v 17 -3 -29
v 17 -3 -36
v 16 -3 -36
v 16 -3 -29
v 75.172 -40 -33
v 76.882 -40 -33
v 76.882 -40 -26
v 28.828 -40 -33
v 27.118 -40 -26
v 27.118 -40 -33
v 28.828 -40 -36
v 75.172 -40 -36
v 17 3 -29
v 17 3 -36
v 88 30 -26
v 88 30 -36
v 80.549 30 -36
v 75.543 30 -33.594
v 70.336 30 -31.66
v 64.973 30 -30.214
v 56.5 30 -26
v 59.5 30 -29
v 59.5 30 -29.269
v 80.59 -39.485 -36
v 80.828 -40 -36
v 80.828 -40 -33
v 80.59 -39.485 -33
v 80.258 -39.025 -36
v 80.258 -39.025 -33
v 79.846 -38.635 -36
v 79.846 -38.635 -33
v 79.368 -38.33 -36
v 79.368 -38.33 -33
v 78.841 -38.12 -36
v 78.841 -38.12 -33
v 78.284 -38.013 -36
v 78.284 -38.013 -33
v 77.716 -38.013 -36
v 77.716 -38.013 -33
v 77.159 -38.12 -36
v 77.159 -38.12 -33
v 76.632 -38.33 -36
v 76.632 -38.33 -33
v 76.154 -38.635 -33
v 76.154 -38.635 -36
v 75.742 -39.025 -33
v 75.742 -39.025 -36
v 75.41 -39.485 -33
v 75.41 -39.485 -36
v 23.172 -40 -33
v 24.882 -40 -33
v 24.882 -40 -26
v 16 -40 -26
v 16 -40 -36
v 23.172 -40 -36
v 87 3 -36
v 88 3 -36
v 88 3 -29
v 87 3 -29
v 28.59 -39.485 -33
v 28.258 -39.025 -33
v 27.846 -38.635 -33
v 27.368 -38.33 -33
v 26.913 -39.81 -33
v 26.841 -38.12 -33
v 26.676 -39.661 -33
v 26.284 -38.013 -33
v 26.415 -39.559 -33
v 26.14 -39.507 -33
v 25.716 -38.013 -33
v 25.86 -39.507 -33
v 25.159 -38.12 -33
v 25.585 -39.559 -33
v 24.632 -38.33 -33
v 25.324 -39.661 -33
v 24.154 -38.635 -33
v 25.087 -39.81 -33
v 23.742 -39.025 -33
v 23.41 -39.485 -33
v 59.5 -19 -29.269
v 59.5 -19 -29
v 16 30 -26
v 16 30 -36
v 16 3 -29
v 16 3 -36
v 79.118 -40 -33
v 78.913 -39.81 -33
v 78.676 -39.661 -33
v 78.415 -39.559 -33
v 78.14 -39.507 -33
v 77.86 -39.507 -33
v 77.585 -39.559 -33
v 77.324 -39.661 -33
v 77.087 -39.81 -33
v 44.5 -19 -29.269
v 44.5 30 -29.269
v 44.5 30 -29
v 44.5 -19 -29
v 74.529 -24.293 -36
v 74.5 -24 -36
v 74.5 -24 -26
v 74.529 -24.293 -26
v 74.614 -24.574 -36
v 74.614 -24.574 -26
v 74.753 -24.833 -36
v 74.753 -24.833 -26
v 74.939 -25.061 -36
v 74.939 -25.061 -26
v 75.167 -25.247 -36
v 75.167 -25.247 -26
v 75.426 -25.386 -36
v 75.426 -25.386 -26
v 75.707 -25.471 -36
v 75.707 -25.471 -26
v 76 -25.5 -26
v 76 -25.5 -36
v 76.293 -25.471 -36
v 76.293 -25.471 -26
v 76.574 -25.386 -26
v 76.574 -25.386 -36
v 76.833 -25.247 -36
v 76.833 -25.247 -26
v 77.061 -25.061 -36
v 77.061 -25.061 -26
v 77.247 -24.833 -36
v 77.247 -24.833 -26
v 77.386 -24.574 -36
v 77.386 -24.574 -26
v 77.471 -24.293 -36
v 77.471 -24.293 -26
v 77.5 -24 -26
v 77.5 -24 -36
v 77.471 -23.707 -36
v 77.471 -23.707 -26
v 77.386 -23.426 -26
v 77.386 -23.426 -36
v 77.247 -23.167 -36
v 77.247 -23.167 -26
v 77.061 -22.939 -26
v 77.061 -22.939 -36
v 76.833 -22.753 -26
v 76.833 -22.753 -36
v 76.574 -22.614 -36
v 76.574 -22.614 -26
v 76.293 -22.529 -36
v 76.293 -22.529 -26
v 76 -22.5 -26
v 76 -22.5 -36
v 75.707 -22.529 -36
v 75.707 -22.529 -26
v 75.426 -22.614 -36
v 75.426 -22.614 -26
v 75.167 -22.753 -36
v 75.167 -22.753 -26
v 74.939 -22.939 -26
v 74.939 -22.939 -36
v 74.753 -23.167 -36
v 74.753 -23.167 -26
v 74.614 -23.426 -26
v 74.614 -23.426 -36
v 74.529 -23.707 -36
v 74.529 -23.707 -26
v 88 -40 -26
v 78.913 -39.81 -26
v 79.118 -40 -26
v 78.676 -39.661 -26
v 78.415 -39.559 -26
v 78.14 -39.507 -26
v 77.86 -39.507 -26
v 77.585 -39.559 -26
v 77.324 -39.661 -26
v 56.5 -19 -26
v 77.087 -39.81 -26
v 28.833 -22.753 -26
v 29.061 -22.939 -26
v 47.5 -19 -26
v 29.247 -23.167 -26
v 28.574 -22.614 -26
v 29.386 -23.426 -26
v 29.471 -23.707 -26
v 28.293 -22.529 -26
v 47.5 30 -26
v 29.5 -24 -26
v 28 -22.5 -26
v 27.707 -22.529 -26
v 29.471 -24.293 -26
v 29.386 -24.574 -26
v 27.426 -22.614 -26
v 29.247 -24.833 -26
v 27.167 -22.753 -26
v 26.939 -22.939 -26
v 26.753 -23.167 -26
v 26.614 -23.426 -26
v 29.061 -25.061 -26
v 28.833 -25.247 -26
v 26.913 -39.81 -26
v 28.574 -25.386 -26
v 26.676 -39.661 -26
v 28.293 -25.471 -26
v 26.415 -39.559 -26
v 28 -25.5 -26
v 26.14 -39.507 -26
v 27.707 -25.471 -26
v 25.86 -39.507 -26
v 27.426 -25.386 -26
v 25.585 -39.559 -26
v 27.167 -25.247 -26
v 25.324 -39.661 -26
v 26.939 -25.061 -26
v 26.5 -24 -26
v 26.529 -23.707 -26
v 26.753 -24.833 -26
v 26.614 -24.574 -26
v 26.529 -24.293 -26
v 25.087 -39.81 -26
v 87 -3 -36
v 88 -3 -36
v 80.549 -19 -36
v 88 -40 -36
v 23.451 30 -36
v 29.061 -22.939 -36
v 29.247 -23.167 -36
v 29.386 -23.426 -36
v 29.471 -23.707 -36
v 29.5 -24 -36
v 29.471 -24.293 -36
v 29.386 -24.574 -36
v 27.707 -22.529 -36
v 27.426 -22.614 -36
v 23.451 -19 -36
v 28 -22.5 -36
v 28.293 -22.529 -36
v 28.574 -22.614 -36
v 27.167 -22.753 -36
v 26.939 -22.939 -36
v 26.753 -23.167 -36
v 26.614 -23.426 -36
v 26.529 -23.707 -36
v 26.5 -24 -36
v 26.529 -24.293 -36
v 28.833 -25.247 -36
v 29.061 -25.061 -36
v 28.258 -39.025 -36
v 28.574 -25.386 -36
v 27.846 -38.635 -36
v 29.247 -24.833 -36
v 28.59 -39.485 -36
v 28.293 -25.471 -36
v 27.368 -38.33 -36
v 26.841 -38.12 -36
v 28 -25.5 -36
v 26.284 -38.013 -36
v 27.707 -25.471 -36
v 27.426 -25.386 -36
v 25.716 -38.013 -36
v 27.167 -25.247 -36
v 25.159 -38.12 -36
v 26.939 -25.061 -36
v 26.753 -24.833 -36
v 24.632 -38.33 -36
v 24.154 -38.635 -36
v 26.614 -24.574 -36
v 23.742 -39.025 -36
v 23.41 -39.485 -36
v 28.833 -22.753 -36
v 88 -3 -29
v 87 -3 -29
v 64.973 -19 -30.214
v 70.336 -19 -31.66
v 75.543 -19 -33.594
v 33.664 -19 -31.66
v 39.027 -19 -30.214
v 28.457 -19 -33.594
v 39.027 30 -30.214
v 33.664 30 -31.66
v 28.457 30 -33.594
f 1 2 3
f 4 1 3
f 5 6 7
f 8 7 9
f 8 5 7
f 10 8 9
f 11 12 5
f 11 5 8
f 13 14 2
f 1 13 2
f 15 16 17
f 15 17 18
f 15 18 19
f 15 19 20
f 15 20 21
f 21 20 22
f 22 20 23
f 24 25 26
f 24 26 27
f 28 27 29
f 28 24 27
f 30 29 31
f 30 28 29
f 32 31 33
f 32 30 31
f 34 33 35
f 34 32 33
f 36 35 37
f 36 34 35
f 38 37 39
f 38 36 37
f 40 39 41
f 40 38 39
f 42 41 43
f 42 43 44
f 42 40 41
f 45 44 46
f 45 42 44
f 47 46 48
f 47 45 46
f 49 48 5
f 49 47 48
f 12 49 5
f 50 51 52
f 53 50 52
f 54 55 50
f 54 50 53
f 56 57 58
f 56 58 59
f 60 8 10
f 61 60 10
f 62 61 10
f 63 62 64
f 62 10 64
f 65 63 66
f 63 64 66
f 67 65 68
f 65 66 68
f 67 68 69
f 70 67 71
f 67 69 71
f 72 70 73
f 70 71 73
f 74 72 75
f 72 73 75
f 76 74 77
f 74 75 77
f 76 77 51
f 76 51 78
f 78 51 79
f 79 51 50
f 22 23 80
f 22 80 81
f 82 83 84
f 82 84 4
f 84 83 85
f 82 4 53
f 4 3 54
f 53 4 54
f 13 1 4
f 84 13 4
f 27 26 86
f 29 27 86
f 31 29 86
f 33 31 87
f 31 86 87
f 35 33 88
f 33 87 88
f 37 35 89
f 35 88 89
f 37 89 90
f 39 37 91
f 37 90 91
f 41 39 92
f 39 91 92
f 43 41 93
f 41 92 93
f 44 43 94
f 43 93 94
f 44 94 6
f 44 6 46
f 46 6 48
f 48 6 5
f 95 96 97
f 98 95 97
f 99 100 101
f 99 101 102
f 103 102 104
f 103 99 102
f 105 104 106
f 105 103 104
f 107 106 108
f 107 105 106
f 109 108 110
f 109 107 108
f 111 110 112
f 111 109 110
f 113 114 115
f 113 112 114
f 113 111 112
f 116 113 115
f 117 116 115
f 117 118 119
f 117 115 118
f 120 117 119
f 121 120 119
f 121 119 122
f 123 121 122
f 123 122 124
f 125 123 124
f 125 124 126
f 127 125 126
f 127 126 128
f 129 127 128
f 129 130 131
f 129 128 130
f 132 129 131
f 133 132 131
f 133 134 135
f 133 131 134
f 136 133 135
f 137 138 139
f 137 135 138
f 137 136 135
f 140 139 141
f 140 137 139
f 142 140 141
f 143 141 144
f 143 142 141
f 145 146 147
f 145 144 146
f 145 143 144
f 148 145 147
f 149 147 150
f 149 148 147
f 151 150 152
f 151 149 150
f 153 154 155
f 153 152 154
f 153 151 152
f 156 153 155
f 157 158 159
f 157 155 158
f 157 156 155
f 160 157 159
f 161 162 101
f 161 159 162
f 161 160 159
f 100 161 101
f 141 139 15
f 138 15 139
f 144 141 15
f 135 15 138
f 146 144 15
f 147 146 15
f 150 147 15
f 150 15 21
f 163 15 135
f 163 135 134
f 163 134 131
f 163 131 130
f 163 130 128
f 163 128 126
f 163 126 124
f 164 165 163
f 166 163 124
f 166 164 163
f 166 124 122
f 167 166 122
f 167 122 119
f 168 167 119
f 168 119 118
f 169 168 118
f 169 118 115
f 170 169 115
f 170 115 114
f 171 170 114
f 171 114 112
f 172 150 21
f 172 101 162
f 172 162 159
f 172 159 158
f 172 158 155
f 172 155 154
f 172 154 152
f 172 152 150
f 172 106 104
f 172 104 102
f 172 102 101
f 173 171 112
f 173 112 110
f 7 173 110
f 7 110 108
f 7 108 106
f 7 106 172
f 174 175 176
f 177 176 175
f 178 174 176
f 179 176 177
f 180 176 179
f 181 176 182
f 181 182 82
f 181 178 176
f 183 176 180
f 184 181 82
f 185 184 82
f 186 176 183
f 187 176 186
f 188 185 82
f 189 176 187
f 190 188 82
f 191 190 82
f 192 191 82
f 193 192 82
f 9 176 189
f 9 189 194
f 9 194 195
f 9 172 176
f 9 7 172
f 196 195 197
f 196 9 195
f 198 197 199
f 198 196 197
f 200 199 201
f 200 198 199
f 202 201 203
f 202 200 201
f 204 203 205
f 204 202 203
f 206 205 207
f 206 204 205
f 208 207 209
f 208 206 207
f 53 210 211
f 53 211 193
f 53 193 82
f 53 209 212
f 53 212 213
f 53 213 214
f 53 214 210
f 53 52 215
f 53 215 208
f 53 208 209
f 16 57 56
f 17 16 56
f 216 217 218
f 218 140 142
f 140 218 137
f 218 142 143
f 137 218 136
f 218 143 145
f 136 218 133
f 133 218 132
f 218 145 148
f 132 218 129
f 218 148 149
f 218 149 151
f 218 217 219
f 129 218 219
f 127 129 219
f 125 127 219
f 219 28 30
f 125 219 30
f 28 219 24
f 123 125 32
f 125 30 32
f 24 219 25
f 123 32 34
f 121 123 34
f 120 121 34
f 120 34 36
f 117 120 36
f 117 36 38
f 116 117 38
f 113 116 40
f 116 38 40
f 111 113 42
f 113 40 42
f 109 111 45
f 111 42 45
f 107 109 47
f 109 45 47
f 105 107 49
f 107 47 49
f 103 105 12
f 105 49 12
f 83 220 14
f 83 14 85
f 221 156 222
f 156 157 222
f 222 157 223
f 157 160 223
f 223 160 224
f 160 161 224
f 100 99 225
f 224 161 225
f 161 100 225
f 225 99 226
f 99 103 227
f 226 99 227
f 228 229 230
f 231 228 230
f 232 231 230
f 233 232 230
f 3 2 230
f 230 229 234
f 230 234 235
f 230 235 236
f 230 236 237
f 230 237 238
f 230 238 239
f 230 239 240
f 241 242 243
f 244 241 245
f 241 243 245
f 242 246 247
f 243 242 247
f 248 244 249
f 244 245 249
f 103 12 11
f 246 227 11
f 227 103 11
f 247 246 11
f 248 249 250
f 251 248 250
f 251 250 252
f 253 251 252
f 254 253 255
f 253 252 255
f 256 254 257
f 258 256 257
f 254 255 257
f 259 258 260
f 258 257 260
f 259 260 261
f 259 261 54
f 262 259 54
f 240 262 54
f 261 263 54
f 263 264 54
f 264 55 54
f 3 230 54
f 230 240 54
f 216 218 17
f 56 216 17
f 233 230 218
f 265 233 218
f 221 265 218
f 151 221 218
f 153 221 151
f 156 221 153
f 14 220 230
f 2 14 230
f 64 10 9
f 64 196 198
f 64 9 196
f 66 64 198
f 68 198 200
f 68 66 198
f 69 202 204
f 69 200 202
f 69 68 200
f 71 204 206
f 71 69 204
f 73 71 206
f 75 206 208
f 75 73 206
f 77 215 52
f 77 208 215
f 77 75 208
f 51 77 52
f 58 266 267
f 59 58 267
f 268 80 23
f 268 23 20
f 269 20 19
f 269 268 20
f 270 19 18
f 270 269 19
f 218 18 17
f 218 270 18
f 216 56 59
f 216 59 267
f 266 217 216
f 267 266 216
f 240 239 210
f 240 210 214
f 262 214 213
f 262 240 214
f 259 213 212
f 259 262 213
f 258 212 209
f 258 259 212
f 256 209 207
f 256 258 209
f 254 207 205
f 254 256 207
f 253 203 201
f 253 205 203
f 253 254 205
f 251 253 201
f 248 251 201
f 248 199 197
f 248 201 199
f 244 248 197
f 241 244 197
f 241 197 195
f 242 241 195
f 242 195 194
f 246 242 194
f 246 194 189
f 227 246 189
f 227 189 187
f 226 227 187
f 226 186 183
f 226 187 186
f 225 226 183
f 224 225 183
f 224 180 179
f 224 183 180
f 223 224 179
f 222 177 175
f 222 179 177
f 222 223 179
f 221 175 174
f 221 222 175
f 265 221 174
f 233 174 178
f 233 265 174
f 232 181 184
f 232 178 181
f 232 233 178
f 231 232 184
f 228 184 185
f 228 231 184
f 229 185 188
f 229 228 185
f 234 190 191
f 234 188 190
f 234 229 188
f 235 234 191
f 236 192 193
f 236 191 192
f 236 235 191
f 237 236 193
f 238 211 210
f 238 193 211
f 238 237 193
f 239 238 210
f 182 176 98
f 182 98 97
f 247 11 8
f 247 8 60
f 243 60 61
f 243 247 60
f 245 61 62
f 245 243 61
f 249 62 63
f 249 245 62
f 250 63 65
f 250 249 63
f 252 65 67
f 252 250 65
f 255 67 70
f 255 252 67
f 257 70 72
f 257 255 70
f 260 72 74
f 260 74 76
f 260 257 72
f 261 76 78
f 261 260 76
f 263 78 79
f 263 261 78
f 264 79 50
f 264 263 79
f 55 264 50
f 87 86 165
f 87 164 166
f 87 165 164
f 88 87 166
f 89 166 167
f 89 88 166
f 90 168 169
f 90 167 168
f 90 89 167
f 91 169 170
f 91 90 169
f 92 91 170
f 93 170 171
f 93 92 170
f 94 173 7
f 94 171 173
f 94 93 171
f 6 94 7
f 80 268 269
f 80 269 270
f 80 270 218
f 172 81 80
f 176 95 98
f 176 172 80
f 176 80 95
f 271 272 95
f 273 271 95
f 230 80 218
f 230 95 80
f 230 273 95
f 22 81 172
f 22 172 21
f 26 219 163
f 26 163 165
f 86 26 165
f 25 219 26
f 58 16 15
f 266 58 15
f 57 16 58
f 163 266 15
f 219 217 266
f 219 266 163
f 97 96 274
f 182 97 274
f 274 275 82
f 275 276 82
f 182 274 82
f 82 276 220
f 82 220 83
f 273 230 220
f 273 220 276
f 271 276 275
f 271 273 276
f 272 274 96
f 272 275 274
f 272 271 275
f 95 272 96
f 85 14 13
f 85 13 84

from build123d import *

# Parameters (mm, degrees)
BOX587_W                    = 4
BOX587_H                    = 15
BOX587_DEPTH                = 49
CHAMFER054_SIZE             = 3
CHAMFER054_PLACEMENT_ANGLE  = 90
CHAMFER053_SIZE             = 3
CHAMFER053_PLACEMENT_ANGLE  = 135
CHAMFER052_SIZE             = 3
CHAMFER052_PLACEMENT_ANGLE  = 180
CHAMFER051_SIZE             = 3
CHAMFER051_PLACEMENT_ANGLE  = 225
CHAMFER050_SIZE             = 3
CHAMFER050_PLACEMENT_ANGLE  = 90
CHAMFER049_SIZE             = 3
CHAMFER049_PLACEMENT_ANGLE  = 45
CHAMFER056_SIZE             = 3
CHAMFER055_SIZE             = 3
CHAMFER055_PLACEMENT_ANGLE  = 45
COMPOUND992_PLACEMENT_ANGLE = 90
BOX596_W                    = 6
BOX596_H                    = 6
BOX596_DEPTH                = 64
BOX597_W                    = 6
BOX597_H                    = 6
BOX597_DEPTH                = 64
CYLINDER2411_R              = 60.2
CYLINDER2411_DEPTH          = 58
CYLINDER2395_R              = 1.5
CYLINDER2395_DEPTH          = 32
CYLINDER2380_R              = 1.5
CYLINDER2380_DEPTH          = 32
CYLINDER2370_R              = 1.5
CYLINDER2370_DEPTH          = 100
CYLINDER2383_R              = 1.5
CYLINDER2383_DEPTH          = 100
CYLINDER2384_R              = 3
CYLINDER2384_DEPTH          = 3
CYLINDER2387_R              = 3
CYLINDER2387_DEPTH          = 3
CYLINDER2377_R              = 1.5
CYLINDER2377_DEPTH          = 50
CYLINDER2369_R              = 1.5
CYLINDER2369_DEPTH          = 50
CYLINDER2358_R              = 1.5
CYLINDER2358_DEPTH          = 50
CYLINDER2366_R              = 1.5
CYLINDER2366_DEPTH          = 50
CYLINDER2355_R              = 1.5
CYLINDER2355_DEPTH          = 100
CYLINDER2376_R              = 1.5
CYLINDER2376_DEPTH          = 100
CYLINDER2372_R              = 1.5
CYLINDER2372_DEPTH          = 100
CYLINDER2381_R              = 1.5
CYLINDER2381_DEPTH          = 100
BOX591_W                    = 72
BOX591_H                    = 70
BOX591_DEPTH                = 10
CUT583_PLACEMENT_ANGLE      = 180


with BuildPart() as krychle587:
    # Box587 → Box587 (new body)
    with BuildSketch(Plane(origin=(59, -7.5, 20), x_dir=(1, 0, 0), z_dir=(0, 0, 1))):
        with Locations((2, 7.5)):
            Rectangle(BOX587_W, BOX587_H)
    extrude(amount=BOX587_DEPTH)


with BuildPart() as chamfer054:
    # Chamfer054 base: copy of Krychle587
    add(krychle587.part)

    # Chamfer054
    chamfer054_edges = [chamfer054.edges().sort_by_distance(p)[0] for p in [
        (63, -7.5, 44.5),
        (63, 7.5, 44.5),
    ]]
    chamfer(chamfer054_edges, length=CHAMFER054_SIZE)


with BuildPart() as chamfer054_1:
    # Chamfer054 placement: moved
    add(chamfer054.part.rotate(Axis((0, 0, 0), (0, 0, 1)), CHAMFER054_PLACEMENT_ANGLE))


with BuildPart() as chamfer053:
    # Chamfer053 base: copy of Krychle587
    add(krychle587.part)

    # Chamfer053
    chamfer053_edges = [chamfer053.edges().sort_by_distance(p)[0] for p in [
        (63, -7.5, 44.5),
        (63, 7.5, 44.5),
    ]]
    chamfer(chamfer053_edges, length=CHAMFER053_SIZE)


with BuildPart() as chamfer053_1:
    # Chamfer053 placement: moved
    add(chamfer053.part.rotate(Axis((0, 0, 0), (0, 0, 1)), CHAMFER053_PLACEMENT_ANGLE))


with BuildPart() as chamfer052:
    # Chamfer052 base: copy of Krychle587
    add(krychle587.part)

    # Chamfer052
    chamfer052_edges = [chamfer052.edges().sort_by_distance(p)[0] for p in [
        (63, -7.5, 44.5),
        (63, 7.5, 44.5),
    ]]
    chamfer(chamfer052_edges, length=CHAMFER052_SIZE)


with BuildPart() as chamfer052_1:
    # Chamfer052 placement: moved
    add(chamfer052.part.rotate(Axis((0, 0, 0), (0, 0, 1)), CHAMFER052_PLACEMENT_ANGLE))


with BuildPart() as chamfer051:
    # Chamfer051 base: copy of Krychle587
    add(krychle587.part)

    # Chamfer051
    chamfer051_edges = [chamfer051.edges().sort_by_distance(p)[0] for p in [
        (63, -7.5, 44.5),
        (63, 7.5, 44.5),
    ]]
    chamfer(chamfer051_edges, length=CHAMFER051_SIZE)


with BuildPart() as chamfer051_1:
    # Chamfer051 placement: moved
    add(chamfer051.part.rotate(Axis((0, 0, 0), (0, 0, 1)), CHAMFER051_PLACEMENT_ANGLE))


with BuildPart() as chamfer050:
    # Chamfer050 base: copy of Krychle587
    add(krychle587.part)

    # Chamfer050
    chamfer050_edges = [chamfer050.edges().sort_by_distance(p)[0] for p in [
        (63, -7.5, 44.5),
        (63, 7.5, 44.5),
    ]]
    chamfer(chamfer050_edges, length=CHAMFER050_SIZE)


with BuildPart() as chamfer050_1:
    # Chamfer050 placement: moved
    add(chamfer050.part.rotate(Axis((0, 0, 0), (0, 0, -1)), CHAMFER050_PLACEMENT_ANGLE))


with BuildPart() as chamfer049:
    # Chamfer049 base: copy of Krychle587
    add(krychle587.part)

    # Chamfer049
    chamfer049_edges = [chamfer049.edges().sort_by_distance(p)[0] for p in [
        (63, -7.5, 44.5),
        (63, 7.5, 44.5),
    ]]
    chamfer(chamfer049_edges, length=CHAMFER049_SIZE)


with BuildPart() as chamfer049_1:
    # Chamfer049 placement: moved
    add(chamfer049.part.rotate(Axis((0, 0, 0), (0, 0, -1)), CHAMFER049_PLACEMENT_ANGLE))


with BuildPart() as chamfer056:
    # Chamfer056 base: copy of Krychle587
    add(krychle587.part)

    # Chamfer056
    chamfer056_edges = [chamfer056.edges().sort_by_distance(p)[0] for p in [
        (63, -7.5, 44.5),
        (63, 7.5, 44.5),
    ]]
    chamfer(chamfer056_edges, length=CHAMFER056_SIZE)


with BuildPart() as compound992:
    # Chamfer055 base: copy of Krychle587
    add(krychle587.part)

    # Chamfer055
    chamfer055_edges = [compound992.edges().sort_by_distance(p)[0] for p in [
        (63, -7.5, 44.5),
        (63, 7.5, 44.5),
    ]]
    chamfer(chamfer055_edges, length=CHAMFER055_SIZE)


with BuildPart() as compound992_1:
    # Chamfer055 placement: moved
    add(compound992.part.rotate(Axis((0, 0, 0), (0, 0, 1)), CHAMFER055_PLACEMENT_ANGLE))

    # Compound992: union Chamfer054, Chamfer053, Chamfer052, Chamfer051, Chamfer050, Chamfer049, Chamfer056
    add(chamfer054_1.part)
    add(chamfer053_1.part)
    add(chamfer052_1.part)
    add(chamfer051_1.part)
    add(chamfer050_1.part)
    add(chamfer049_1.part)
    add(chamfer056.part)


with BuildPart() as compound992_2:
    # Compound992 placement: moved
    add(compound992_1.part.moved(Location((52, -39, -89))).rotate(Axis((52, -39, -89), (-1, 0, 0)), COMPOUND992_PLACEMENT_ANGLE))


with BuildPart() as krychle596:
    # Box596 → Box596 (new body)
    with BuildSketch(Plane(origin=(87, -3, -93), x_dir=(1, 0, 0), z_dir=(0, 0, 1))):
        with Locations((3, 3)):
            Rectangle(BOX596_W, BOX596_H)
    extrude(amount=BOX596_DEPTH)


with BuildPart() as compound1007:
    # Box597 → Box597 (new body)
    with BuildSketch(Plane(origin=(11, -3, -93), x_dir=(1, 0, 0), z_dir=(0, 0, 1))):
        with Locations((3, 3)):
            Rectangle(BOX597_W, BOX597_H)
    extrude(amount=BOX597_DEPTH)

    # Compound1007: union Krychle596
    add(krychle596.part)


with BuildPart() as compound1007_1:
    # Compound1007 placement: moved
    add(compound1007.part.moved(Location((-52, 0, 36))))


with BuildPart() as v_lec2411:
    # Cylinder2411 → Cylinder2411 (new body)
    with BuildSketch(Plane(origin=(0, 19, -53), x_dir=(1, 0, 0), z_dir=(0, -1, 0))):
        Circle(CYLINDER2411_R)
    extrude(amount=CYLINDER2411_DEPTH)


with BuildPart() as v_lec2395:
    # Cylinder2395 → Cylinder2395 (new body)
    with BuildSketch(Plane(origin=(78, 41, -42), x_dir=(1, 0, 0), z_dir=(0, 0, 1))):
        Circle(CYLINDER2395_R)
    extrude(amount=CYLINDER2395_DEPTH)


with BuildPart() as compound1001:
    # Cylinder2380 → Cylinder2380 (new body)
    with BuildSketch(Plane(origin=(26, 41, -42), x_dir=(1, 0, 0), z_dir=(0, 0, 1))):
        Circle(CYLINDER2380_R)
    extrude(amount=CYLINDER2380_DEPTH)

    # Compound1001: union Válec2395
    add(v_lec2395.part)


with BuildPart() as compound1001_1:
    # Compound1001 placement: moved
    add(compound1001.part.moved(Location((-52, 0, 36))))


with BuildPart() as v_lec2370:
    # Cylinder2370 → Cylinder2370 (new body)
    with BuildSketch(Plane(origin=(14, 0, -60), x_dir=(1, 0, 0), z_dir=(0, 0, 1))):
        Circle(CYLINDER2370_R)
    extrude(amount=CYLINDER2370_DEPTH)


with BuildPart() as compound1011:
    # Cylinder2383 → Cylinder2383 (new body)
    with BuildSketch(Plane(origin=(90, 0, -60), x_dir=(1, 0, 0), z_dir=(0, 0, 1))):
        Circle(CYLINDER2383_R)
    extrude(amount=CYLINDER2383_DEPTH)

    # Compound1003: union Válec2370
    add(v_lec2370.part)


with BuildPart() as compound1011_1:
    # Compound1003 placement: moved
    add(compound1011.part.moved(Location((-52, 0, 0))))

    # Compound1011: union Compound1001
    add(compound1001_1.part)


with BuildPart() as v_lec2384:
    # Cylinder2384 → Cylinder2384 (new body)
    with BuildSketch(Plane(origin=(78, 41, -42), x_dir=(1, 0, 0), z_dir=(0, 0, 1))):
        Circle(CYLINDER2384_R)
    extrude(amount=CYLINDER2384_DEPTH)


with BuildPart() as compound1020:
    # Cylinder2387 → Cylinder2387 (new body)
    with BuildSketch(Plane(origin=(26, 41, -42), x_dir=(1, 0, 0), z_dir=(0, 0, 1))):
        Circle(CYLINDER2387_R)
    extrude(amount=CYLINDER2387_DEPTH)

    # Compound1020: union Válec2384
    add(v_lec2384.part)


with BuildPart() as compound1020_1:
    # Compound1020 placement: moved
    add(compound1020.part.moved(Location((-52, 0, 42))))


with BuildPart() as v_lec2377:
    # Cylinder2377 → Cylinder2377 (new body)
    with BuildSketch(Plane(origin=(-51, 6, 0), x_dir=(1, 0, 0), z_dir=(0, 0, 1))):
        Circle(CYLINDER2377_R)
    extrude(amount=CYLINDER2377_DEPTH)


with BuildPart() as v_lec2369:
    # Cylinder2369 → Cylinder2369 (new body)
    with BuildSketch(Plane(origin=(-24, 18, 0), x_dir=(1, 0, 0), z_dir=(0, 0, 1))):
        Circle(CYLINDER2369_R)
    extrude(amount=CYLINDER2369_DEPTH)


with BuildPart() as v_lec2358:
    # Cylinder2358 → Cylinder2358 (new body)
    with BuildSketch(Plane(origin=(24, 18, 0), x_dir=(1, 0, 0), z_dir=(0, 0, 1))):
        Circle(CYLINDER2358_R)
    extrude(amount=CYLINDER2358_DEPTH)


with BuildPart() as compound998:
    # Cylinder2366 → Cylinder2366 (new body)
    with BuildSketch(Plane(origin=(51, 6, 0), x_dir=(1, 0, 0), z_dir=(0, 0, 1))):
        Circle(CYLINDER2366_R)
    extrude(amount=CYLINDER2366_DEPTH)

    # Compound998: union Válec2377, Válec2369, Válec2358
    add(v_lec2377.part)
    add(v_lec2369.part)
    add(v_lec2358.part)


with BuildPart() as compound998_1:
    # Compound998 placement: moved
    add(compound998.part.moved(Location((0, 6, 0))))


with BuildPart() as v_lec2355:
    # Cylinder2355 → Cylinder2355 (new body)
    with BuildSketch(Plane(origin=(51, -12, 0), x_dir=(1, 0, 0), z_dir=(0, 0, 1))):
        Circle(CYLINDER2355_R)
    extrude(amount=CYLINDER2355_DEPTH)


with BuildPart() as compound1019:
    # Cylinder2376 → Cylinder2376 (new body)
    with BuildSketch(Plane(origin=(-51, -12, 0), x_dir=(1, 0, 0), z_dir=(0, 0, 1))):
        Circle(CYLINDER2376_R)
    extrude(amount=CYLINDER2376_DEPTH)

    # Compound1019: union Válec2355
    add(v_lec2355.part)


with BuildPart() as v_lec2372:
    # Cylinder2372 → Cylinder2372 (new body)
    with BuildSketch(Plane(origin=(39, -21, 0), x_dir=(1, 0, 0), z_dir=(0, 0, 1))):
        Circle(CYLINDER2372_R)
    extrude(amount=CYLINDER2372_DEPTH)


with BuildPart() as compound995:
    # Cylinder2381 → Cylinder2381 (new body)
    with BuildSketch(Plane(origin=(-39, -21, 0), x_dir=(1, 0, 0), z_dir=(0, 0, 1))):
        Circle(CYLINDER2381_R)
    extrude(amount=CYLINDER2381_DEPTH)

    # Compound1000: union Válec2372
    add(v_lec2372.part)


with BuildPart() as compound995_1:
    # Compound1000 placement: moved
    add(compound995.part.moved(Location((0, -6, 0))))

    # Compound995: union Compound998, Compound1019
    add(compound998_1.part)
    add(compound1019.part)


with BuildPart() as compound995_2:
    # Compound995 placement: moved
    add(compound995_1.part.moved(Location((0, 0, -10))))


with BuildPart() as cut594:
    # Box591 → Box591 (new body)
    with BuildSketch(Plane(origin=(-36, -30, 0), x_dir=(1, 0, 0), z_dir=(0, 0, 1))):
        with Locations((36, 35)):
            Rectangle(BOX591_W, BOX591_H)
    extrude(amount=BOX591_DEPTH)

    # Cut582: cut Compound995
    add(compound995_2.part, mode=Mode.SUBTRACT)

    # Cut576: cut Compound1020
    add(compound1020_1.part, mode=Mode.SUBTRACT)

    # Cut573: cut Compound1011
    add(compound1011_1.part, mode=Mode.SUBTRACT)

    # Cut579: cut Válec2411
    add(v_lec2411.part, mode=Mode.SUBTRACT)

    # Cut583: cut Compound1007
    add(compound1007_1.part, mode=Mode.SUBTRACT)


with BuildPart() as cut594_1:
    # Cut583 placement: moved
    add(cut594.part.moved(Location((52, 0, -36))).rotate(Axis((52, 0, -36), (0, 0, 1)), CUT583_PLACEMENT_ANGLE))

    # Cut594: cut Compound992
    add(compound992_2.part, mode=Mode.SUBTRACT)


solid = cut594_1.part
